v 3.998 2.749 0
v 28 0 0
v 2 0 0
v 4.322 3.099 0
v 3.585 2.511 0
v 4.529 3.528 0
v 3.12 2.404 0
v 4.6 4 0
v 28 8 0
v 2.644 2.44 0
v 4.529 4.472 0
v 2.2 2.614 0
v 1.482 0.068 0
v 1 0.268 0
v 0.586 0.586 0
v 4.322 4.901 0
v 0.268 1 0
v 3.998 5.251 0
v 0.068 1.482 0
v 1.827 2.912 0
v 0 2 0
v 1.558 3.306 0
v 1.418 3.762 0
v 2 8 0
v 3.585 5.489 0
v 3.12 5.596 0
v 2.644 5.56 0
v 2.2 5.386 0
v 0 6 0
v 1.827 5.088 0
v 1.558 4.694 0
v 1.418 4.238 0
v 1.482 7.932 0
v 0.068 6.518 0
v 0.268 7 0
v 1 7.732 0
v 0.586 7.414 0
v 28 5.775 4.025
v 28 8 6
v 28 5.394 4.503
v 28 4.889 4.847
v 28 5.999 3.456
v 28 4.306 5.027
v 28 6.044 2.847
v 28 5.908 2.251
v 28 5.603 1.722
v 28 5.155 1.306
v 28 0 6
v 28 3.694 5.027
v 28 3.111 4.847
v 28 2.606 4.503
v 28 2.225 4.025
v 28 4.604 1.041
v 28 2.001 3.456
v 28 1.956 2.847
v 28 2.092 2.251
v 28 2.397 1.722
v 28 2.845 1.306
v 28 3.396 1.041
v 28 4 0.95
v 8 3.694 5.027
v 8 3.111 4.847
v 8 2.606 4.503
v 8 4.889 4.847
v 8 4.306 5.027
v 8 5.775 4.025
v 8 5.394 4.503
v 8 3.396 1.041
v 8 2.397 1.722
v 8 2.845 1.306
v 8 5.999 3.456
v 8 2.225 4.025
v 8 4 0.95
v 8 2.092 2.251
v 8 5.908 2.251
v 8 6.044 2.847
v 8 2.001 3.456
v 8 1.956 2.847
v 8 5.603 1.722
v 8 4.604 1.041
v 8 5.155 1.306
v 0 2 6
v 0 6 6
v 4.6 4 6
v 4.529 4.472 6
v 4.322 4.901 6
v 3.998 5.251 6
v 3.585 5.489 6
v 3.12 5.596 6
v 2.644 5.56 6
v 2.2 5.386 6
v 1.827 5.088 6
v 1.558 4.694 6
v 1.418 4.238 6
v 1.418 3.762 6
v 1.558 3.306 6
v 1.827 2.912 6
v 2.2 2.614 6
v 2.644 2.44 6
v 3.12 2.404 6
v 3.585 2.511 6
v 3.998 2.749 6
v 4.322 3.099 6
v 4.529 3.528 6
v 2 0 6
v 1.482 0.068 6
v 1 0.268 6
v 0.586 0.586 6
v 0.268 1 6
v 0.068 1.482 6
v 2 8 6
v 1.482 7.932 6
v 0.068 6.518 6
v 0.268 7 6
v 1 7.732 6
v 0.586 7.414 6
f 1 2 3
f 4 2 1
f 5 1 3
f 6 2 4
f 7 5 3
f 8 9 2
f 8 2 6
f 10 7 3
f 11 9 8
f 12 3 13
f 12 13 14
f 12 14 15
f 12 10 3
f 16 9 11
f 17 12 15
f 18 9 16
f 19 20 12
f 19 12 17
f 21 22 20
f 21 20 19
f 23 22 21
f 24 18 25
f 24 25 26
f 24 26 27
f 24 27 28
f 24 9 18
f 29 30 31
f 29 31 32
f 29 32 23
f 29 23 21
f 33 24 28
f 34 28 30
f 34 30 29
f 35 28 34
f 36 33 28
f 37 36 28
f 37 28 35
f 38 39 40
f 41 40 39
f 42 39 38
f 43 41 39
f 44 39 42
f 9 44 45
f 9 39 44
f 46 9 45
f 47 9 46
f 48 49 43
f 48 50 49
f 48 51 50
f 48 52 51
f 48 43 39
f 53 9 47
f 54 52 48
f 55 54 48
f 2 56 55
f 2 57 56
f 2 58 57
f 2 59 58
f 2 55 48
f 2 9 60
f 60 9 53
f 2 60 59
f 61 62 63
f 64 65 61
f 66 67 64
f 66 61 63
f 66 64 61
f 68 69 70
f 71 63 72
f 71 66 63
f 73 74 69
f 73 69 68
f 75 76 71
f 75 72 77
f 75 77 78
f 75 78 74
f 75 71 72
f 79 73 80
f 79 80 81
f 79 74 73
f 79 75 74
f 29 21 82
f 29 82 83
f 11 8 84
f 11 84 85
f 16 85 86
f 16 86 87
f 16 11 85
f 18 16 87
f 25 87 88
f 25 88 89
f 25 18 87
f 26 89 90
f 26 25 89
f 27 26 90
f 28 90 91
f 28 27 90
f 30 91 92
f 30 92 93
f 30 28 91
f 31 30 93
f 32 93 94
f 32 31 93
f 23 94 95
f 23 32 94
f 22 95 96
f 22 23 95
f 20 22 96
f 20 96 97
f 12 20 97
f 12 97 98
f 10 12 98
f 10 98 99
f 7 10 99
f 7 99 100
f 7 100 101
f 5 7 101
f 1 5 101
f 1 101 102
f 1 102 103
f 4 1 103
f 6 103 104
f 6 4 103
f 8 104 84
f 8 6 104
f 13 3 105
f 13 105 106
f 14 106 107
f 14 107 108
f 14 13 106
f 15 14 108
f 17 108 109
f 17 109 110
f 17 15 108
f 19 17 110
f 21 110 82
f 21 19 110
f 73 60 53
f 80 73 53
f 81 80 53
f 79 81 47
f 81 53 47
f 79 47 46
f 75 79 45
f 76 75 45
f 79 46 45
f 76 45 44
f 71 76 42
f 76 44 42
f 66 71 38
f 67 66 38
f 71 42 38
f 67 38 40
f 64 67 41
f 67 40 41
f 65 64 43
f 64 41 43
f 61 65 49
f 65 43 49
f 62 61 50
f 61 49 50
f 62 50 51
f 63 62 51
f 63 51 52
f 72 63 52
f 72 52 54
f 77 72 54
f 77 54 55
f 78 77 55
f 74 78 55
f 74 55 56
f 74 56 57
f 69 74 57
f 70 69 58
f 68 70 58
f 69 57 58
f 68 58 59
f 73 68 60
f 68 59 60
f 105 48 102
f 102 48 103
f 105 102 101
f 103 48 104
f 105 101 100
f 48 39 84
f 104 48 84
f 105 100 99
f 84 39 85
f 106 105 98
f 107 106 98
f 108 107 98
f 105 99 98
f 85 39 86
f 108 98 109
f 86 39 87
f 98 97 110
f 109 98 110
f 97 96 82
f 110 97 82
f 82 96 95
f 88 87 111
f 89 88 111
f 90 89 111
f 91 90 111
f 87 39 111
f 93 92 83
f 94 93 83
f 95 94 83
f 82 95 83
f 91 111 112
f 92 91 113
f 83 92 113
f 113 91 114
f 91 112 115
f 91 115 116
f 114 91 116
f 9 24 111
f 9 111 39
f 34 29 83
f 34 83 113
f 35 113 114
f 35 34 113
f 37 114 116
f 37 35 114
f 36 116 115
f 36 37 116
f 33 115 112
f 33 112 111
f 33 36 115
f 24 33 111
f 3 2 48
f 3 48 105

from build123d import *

# Parameters (mm, degrees)
SKETCH_2_R          = 1.6
EXTRUDE_1_DEPTH     = 6
SKETCH_3_R          = 2.05
CUT_EXTRUDE_1_DEPTH = 20


with BuildPart() as part:
    # 草图2 → 凸台-拉伸1 (new body)
    with BuildSketch(Plane.XY):
        with BuildLine():
            Line((0, 2), (0, 6))
            ThreePointArc((0, 6), (0.585786438, 7.414213562), (2, 8))
            Line((2, 8), (28, 8))
            Line((28, 8), (28, 0))
            Line((28, 0), (2, 0))
            ThreePointArc((2, 0), (0.585786438, 0.585786438), (0, 2))
        make_face()
        with Locations((3, 4)):
            Circle(SKETCH_2_R, mode=Mode.SUBTRACT)
    extrude(amount=EXTRUDE_1_DEPTH)

    # 草图3 → 切除-拉伸1 (cut)
    with BuildSketch(Plane(origin=(28, 0, 0), x_dir=(0, 0, -1), z_dir=(1, 0, 0))):
        with Locations((-3, 4)):
            Circle(SKETCH_3_R)
    extrude(amount=-CUT_EXTRUDE_1_DEPTH, mode=Mode.SUBTRACT)


solid = part.part
